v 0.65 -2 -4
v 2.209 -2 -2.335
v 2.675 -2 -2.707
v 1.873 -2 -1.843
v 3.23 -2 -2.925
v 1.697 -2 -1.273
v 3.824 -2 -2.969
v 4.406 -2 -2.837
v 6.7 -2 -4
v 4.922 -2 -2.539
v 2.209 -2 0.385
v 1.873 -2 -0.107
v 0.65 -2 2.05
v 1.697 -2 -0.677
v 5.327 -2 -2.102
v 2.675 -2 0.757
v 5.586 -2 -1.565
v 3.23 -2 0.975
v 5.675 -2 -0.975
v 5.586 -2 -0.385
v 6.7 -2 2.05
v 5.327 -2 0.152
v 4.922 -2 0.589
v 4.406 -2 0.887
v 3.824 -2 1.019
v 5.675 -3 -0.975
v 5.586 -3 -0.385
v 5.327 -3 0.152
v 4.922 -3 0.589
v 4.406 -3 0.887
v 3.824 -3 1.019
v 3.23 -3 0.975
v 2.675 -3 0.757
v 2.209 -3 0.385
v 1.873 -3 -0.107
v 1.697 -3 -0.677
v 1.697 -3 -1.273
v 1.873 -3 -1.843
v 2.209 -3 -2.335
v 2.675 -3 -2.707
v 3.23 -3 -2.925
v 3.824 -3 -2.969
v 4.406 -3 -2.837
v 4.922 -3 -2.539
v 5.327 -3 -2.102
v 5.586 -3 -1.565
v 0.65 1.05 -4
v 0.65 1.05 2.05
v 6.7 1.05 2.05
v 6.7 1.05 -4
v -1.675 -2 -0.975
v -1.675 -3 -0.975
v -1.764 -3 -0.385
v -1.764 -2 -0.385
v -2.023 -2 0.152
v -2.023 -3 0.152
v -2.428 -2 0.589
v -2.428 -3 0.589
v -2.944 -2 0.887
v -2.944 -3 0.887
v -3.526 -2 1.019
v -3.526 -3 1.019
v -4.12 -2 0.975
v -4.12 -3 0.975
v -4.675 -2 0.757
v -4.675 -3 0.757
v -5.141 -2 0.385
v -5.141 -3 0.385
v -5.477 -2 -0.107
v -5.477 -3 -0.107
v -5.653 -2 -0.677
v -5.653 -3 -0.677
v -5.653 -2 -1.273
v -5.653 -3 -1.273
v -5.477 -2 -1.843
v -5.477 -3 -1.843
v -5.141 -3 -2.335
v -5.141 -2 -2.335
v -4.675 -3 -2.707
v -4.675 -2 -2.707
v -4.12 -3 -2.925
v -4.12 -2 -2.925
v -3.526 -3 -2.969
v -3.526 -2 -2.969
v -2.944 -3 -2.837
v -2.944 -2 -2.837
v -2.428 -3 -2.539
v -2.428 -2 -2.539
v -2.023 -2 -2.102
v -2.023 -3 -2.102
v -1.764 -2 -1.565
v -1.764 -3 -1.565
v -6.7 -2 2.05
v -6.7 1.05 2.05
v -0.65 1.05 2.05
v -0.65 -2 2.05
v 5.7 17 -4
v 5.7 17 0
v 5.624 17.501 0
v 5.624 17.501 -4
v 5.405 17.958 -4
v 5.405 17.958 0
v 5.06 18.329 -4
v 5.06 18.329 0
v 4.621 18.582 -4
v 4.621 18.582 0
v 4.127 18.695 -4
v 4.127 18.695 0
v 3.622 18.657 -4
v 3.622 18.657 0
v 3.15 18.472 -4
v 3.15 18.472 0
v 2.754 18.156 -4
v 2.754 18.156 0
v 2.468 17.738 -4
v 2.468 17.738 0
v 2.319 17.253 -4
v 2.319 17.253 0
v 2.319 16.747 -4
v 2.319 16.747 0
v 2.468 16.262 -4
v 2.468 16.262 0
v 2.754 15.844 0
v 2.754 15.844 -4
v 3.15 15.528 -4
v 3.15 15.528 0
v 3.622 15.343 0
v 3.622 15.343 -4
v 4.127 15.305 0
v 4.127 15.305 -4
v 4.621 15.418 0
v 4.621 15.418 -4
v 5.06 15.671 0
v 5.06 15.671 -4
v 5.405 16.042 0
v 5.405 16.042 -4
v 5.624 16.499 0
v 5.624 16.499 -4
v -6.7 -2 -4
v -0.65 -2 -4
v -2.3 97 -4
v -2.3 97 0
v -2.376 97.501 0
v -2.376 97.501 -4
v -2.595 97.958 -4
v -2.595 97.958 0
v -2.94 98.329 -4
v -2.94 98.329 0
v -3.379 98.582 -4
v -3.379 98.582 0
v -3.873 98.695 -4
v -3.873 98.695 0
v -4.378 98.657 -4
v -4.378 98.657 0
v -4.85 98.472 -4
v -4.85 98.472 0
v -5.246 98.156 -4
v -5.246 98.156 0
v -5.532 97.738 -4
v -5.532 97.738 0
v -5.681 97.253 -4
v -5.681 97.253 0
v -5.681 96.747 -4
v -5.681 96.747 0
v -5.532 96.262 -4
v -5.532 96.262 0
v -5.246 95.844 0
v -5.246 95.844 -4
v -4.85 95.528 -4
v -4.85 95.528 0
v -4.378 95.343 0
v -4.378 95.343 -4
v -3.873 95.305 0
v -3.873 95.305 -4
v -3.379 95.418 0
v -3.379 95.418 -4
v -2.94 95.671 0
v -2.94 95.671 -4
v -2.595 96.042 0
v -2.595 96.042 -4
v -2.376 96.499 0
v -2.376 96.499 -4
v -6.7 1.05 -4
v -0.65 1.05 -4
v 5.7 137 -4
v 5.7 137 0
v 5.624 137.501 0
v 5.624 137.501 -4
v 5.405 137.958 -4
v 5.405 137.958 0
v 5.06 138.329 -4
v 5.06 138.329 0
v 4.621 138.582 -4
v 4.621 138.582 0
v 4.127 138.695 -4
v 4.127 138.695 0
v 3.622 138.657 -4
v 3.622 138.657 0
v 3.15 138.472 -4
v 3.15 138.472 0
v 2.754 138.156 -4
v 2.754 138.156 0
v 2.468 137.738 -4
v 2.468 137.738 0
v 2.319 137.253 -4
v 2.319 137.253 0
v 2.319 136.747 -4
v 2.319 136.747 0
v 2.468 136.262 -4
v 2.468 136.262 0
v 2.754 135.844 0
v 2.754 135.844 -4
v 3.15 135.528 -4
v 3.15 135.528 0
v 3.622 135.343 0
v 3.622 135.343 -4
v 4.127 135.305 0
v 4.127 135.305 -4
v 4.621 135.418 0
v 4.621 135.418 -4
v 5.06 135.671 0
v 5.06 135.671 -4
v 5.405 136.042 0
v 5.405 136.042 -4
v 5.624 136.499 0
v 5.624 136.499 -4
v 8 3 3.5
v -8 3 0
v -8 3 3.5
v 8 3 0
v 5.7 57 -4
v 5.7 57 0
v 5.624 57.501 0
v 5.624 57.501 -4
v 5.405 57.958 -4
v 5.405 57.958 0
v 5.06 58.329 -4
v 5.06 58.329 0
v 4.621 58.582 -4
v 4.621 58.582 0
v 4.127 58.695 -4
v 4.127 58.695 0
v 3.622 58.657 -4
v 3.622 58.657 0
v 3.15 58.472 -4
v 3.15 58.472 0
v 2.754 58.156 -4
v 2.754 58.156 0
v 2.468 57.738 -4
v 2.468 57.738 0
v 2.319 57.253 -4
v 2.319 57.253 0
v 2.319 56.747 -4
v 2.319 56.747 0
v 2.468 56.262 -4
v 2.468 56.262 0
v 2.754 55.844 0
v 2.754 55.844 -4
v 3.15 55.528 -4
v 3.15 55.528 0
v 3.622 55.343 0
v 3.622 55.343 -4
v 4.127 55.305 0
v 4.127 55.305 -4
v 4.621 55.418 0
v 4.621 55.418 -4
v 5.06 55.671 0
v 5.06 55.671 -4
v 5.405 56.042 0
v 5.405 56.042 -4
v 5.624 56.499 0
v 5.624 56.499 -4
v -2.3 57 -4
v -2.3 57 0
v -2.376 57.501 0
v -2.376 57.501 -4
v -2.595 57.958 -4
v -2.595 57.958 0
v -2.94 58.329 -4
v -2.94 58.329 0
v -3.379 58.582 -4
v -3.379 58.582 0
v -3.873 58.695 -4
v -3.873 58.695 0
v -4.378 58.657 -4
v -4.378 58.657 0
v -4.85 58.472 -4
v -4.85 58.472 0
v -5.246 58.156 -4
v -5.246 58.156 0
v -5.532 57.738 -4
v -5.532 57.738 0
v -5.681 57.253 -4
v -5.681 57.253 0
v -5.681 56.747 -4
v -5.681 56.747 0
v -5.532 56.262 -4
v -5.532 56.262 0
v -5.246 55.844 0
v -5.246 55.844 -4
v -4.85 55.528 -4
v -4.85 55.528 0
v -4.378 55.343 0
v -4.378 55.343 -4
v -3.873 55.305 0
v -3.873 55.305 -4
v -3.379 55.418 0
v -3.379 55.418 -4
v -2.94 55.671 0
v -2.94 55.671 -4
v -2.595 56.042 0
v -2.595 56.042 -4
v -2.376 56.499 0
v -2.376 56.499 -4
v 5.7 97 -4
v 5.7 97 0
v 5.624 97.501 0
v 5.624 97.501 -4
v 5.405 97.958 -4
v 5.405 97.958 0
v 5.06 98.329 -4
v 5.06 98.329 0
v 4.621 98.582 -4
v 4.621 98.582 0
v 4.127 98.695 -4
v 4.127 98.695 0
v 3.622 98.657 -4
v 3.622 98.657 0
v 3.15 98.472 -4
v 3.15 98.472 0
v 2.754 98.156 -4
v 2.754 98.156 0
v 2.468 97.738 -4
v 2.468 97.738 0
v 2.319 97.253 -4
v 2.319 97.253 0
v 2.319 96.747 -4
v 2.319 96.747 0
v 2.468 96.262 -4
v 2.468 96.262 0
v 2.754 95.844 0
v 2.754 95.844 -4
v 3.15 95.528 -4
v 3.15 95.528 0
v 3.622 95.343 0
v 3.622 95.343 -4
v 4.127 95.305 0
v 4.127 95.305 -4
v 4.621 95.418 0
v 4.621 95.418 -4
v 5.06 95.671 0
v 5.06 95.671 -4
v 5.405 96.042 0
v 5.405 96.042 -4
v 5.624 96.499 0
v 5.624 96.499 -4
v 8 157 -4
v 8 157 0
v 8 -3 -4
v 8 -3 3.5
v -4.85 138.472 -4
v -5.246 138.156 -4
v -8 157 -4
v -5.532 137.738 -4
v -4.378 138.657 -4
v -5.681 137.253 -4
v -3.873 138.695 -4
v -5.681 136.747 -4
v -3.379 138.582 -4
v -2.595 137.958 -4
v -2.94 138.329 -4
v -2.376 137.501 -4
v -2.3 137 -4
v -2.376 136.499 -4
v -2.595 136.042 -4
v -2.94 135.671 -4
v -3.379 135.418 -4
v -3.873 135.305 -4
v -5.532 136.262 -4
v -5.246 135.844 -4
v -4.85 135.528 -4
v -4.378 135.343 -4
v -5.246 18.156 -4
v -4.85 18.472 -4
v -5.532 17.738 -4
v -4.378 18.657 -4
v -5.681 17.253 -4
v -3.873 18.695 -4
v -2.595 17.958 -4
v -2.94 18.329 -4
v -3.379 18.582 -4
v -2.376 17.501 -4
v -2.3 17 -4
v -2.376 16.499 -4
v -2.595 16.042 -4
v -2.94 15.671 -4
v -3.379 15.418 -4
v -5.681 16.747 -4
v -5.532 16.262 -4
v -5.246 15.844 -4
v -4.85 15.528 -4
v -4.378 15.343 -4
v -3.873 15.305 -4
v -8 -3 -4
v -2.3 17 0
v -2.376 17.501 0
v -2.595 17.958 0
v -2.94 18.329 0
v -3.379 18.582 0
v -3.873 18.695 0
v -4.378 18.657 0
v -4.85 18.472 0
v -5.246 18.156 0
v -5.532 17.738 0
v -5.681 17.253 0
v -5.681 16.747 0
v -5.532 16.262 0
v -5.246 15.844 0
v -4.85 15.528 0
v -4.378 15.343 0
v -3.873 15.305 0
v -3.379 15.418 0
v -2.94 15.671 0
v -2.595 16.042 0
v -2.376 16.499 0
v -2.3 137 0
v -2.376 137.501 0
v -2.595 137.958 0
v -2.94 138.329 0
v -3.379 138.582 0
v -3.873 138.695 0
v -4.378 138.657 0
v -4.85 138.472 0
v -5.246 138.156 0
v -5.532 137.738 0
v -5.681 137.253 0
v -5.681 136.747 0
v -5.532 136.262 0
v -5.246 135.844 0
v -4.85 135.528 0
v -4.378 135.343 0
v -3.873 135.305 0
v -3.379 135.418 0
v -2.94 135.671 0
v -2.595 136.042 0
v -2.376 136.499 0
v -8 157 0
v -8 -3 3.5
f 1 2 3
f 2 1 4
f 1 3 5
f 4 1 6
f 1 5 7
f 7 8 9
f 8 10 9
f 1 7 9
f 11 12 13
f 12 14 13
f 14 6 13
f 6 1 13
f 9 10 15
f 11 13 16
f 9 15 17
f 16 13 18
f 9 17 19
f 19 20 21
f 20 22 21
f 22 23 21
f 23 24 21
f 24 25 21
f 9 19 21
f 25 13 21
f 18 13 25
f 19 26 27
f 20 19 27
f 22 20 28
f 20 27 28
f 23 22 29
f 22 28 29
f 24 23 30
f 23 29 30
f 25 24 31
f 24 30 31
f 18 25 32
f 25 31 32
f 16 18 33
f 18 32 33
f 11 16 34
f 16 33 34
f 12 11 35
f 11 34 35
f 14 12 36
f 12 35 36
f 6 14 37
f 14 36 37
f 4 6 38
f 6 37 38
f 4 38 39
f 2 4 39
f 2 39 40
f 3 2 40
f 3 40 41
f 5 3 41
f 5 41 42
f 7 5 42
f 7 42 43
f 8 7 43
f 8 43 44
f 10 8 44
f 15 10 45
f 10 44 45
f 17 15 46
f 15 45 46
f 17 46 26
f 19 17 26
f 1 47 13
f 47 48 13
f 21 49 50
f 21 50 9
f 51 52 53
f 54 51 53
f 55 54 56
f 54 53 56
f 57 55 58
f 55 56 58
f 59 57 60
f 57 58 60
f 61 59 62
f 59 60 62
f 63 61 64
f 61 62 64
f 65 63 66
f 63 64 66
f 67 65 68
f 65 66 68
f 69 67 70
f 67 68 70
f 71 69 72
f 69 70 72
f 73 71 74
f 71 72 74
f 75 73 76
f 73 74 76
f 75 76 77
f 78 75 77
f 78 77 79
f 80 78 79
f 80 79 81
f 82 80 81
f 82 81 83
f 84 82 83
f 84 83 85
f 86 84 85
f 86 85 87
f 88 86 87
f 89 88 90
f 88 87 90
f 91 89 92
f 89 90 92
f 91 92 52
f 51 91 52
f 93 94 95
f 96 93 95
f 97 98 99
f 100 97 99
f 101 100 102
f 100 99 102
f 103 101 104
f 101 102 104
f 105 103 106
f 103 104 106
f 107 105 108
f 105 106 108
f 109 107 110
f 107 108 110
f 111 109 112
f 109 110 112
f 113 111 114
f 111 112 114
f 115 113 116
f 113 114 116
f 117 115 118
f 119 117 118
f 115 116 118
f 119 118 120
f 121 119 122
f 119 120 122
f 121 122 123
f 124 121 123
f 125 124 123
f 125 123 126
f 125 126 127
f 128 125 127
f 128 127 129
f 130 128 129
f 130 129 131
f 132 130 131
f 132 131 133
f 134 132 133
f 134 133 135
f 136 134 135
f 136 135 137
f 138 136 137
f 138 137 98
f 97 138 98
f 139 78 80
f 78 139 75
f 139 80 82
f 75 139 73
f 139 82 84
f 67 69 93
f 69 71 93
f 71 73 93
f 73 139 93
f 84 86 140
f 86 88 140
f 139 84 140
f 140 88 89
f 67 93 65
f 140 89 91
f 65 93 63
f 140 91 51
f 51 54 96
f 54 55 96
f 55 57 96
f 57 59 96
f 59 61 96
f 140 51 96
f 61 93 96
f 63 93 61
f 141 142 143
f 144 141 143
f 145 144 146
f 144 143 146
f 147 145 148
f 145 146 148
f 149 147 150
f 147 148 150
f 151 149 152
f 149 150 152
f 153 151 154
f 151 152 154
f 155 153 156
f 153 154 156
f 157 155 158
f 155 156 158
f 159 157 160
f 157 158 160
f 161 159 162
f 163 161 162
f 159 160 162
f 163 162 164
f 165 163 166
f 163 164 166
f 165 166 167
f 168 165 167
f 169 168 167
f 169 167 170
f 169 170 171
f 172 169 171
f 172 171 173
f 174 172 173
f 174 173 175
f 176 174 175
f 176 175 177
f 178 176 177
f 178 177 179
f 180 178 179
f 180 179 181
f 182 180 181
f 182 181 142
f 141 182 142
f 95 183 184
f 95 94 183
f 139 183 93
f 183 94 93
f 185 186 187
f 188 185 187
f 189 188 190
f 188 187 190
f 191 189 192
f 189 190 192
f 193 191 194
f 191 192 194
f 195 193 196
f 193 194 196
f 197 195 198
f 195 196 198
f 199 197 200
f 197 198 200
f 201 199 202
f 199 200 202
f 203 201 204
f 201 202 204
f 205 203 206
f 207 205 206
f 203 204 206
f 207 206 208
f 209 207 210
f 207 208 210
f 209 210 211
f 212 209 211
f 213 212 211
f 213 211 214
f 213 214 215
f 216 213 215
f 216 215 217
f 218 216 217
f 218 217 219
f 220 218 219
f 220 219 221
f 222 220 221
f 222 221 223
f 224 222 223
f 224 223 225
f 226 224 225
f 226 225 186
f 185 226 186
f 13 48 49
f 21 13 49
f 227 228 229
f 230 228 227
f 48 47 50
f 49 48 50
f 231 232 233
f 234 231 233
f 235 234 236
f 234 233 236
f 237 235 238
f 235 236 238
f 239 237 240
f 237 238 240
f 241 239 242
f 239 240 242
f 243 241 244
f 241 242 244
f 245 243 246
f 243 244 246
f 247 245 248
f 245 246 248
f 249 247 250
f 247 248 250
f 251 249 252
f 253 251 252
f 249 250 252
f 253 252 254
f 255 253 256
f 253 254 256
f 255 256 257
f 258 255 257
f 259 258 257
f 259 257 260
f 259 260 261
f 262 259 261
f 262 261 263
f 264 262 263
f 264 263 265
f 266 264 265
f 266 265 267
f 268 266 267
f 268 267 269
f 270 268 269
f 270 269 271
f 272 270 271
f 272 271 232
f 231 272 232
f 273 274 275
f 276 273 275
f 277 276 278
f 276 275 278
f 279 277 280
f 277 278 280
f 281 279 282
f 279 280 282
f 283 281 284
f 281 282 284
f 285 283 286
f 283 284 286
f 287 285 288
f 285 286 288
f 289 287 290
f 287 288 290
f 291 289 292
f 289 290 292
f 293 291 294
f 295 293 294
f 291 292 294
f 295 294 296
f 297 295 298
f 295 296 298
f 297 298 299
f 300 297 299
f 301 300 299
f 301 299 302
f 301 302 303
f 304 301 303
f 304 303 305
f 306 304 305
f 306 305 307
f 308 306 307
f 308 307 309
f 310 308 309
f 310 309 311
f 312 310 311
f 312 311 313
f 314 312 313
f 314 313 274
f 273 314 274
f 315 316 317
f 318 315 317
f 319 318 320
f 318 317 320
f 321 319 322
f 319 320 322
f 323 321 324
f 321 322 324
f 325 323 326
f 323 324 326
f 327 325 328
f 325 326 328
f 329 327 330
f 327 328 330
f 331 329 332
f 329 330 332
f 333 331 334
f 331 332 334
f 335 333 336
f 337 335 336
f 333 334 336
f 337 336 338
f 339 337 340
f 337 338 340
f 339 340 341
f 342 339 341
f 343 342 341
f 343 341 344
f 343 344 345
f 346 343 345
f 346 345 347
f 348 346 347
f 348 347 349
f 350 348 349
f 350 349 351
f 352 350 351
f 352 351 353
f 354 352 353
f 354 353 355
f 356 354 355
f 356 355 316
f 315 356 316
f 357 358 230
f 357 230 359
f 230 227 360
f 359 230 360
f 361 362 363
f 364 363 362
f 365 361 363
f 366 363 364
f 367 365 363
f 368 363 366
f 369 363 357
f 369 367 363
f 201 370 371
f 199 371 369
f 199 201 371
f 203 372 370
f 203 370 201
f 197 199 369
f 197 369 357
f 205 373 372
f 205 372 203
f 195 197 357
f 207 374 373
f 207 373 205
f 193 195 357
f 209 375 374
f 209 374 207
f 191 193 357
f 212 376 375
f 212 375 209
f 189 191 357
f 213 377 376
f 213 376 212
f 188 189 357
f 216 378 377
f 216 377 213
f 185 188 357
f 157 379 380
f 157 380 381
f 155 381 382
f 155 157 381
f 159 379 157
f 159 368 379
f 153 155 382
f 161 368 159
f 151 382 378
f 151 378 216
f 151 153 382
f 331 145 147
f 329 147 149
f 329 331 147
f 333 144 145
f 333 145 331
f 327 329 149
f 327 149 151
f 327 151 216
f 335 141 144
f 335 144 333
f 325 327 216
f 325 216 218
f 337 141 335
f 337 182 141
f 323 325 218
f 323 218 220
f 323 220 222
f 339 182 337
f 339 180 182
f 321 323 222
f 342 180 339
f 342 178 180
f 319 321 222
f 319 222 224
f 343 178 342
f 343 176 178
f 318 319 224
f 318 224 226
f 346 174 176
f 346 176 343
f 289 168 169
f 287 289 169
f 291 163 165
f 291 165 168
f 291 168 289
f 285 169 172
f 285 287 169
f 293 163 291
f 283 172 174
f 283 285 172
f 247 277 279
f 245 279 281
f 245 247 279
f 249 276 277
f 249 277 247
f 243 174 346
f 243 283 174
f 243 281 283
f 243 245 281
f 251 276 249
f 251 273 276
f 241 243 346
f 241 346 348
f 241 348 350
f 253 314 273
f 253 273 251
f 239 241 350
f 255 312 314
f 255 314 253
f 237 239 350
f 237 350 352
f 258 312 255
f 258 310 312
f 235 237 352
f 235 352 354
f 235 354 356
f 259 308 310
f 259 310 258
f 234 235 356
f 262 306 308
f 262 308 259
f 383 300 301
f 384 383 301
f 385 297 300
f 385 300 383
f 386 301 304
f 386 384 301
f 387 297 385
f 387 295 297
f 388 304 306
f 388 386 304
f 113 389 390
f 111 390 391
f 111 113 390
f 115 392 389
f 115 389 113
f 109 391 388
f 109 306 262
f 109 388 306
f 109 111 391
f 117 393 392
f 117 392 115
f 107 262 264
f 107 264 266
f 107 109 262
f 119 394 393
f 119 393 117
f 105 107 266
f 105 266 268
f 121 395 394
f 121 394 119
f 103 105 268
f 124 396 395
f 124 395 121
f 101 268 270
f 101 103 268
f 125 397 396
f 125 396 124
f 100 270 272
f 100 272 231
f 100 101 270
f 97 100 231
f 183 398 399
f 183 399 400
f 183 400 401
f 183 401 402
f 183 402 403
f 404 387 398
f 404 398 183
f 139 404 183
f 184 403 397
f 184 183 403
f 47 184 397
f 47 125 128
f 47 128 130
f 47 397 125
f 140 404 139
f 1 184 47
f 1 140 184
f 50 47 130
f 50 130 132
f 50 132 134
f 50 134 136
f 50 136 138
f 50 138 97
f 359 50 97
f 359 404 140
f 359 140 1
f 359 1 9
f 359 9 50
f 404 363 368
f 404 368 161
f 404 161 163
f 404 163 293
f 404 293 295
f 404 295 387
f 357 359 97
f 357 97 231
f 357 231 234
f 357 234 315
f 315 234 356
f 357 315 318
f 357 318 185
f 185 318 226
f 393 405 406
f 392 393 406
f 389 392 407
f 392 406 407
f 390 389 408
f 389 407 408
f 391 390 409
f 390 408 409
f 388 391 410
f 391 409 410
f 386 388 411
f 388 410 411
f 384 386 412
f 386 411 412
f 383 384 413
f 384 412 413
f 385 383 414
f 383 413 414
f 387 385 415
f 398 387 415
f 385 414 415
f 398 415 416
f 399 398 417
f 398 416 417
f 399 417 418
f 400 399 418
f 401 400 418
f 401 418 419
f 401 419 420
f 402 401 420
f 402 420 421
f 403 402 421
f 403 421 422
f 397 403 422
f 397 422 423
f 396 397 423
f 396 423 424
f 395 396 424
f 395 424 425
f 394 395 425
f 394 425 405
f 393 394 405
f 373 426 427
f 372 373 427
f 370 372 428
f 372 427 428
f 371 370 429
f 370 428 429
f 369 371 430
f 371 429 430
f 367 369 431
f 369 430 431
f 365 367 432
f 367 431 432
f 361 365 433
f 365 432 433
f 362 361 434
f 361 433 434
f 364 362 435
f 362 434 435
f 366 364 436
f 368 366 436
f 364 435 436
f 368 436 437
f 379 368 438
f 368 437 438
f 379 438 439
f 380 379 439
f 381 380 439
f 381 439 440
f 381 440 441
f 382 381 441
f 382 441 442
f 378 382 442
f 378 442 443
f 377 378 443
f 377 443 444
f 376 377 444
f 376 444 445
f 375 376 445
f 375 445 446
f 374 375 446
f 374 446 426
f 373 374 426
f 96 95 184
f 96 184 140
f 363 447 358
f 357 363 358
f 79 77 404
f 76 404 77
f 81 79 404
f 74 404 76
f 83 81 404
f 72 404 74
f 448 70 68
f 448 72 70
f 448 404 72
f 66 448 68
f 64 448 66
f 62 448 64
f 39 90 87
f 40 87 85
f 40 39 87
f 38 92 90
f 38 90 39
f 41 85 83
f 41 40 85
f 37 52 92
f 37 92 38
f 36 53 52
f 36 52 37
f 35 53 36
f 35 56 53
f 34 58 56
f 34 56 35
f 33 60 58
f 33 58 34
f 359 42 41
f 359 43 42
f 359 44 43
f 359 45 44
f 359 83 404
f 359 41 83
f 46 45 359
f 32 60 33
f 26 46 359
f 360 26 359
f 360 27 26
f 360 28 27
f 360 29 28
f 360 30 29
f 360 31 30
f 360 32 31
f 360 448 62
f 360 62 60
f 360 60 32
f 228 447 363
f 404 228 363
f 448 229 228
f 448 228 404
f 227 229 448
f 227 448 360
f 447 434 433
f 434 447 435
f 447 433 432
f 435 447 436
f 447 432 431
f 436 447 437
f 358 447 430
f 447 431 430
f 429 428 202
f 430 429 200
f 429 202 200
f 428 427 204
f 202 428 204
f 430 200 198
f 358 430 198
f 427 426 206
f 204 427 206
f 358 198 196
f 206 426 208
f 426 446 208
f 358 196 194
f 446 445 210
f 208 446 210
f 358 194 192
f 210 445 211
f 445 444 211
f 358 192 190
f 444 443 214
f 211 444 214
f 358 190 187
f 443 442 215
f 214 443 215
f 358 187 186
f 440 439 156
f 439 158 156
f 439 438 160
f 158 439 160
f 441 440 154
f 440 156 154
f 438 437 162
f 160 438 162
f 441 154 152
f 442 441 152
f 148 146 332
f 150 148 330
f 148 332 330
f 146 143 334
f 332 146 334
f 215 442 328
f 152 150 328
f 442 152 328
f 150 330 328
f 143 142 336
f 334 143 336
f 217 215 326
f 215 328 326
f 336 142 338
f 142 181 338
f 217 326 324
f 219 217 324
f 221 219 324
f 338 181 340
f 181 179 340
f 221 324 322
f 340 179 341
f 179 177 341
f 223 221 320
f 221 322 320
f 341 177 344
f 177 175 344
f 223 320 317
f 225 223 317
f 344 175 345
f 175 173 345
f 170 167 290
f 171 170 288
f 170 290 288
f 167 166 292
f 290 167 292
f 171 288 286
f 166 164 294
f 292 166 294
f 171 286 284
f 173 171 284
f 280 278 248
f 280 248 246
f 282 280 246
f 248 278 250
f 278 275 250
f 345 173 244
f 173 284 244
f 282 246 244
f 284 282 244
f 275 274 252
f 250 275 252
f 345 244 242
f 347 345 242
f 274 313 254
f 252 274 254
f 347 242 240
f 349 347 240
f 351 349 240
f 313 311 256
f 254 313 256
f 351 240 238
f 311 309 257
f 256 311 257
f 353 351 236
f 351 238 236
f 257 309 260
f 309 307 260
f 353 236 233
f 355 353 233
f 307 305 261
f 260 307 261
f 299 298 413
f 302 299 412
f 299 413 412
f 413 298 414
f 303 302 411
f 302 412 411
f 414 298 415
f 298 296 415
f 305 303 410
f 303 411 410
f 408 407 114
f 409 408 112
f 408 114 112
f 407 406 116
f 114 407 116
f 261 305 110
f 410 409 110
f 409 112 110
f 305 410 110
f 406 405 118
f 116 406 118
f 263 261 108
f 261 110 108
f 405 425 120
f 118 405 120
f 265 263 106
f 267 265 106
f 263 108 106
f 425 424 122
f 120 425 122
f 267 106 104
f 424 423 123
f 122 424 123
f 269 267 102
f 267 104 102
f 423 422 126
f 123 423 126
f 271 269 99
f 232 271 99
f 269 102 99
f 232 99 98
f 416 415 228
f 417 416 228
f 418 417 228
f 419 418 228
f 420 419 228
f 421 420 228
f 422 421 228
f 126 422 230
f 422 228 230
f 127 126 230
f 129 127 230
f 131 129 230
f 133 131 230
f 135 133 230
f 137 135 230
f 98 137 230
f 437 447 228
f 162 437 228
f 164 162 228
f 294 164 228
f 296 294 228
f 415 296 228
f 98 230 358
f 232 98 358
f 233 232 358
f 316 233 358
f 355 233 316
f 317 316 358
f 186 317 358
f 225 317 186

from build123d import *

# Parameters (mm, degrees)
SKETCH_W      = 16
SKETCH_H      = 6
SKETCH_W_2    = 6.05
SKETCH_H_2    = 3.05
PAD_DEPTH     = 2.05
SKETCH001_W   = 16
SKETCH001_H   = 6
PAD001_DEPTH  = 1.45
SKETCH002_W   = 16
SKETCH002_H   = 160
SKETCH002_W_2 = 6.05
SKETCH002_H_2 = 3.05
PAD002_DEPTH  = 4
SKETCH003_R   = 1.7
HOLE_DEPTH    = 25
SKETCH004_R   = 2
POCKET_DEPTH  = 1


with BuildPart() as part:
    # Sketch → Pad (new body)
    with BuildSketch(Plane.XY):
        Rectangle(SKETCH_W, SKETCH_H)
        with Locations((3.675, -0.475)):
            Rectangle(SKETCH_W_2, SKETCH_H_2, mode=Mode.SUBTRACT)
        with Locations((-3.675, -0.475)):
            Rectangle(SKETCH_W_2, SKETCH_H_2, mode=Mode.SUBTRACT)
    extrude(amount=PAD_DEPTH)

    # Sketch001 (on Face14 of Pad) → Pad001 (join)
    with BuildSketch(Plane.XY.offset(2.05)):
        Rectangle(SKETCH001_W, SKETCH001_H)
    extrude(amount=PAD001_DEPTH)

    # Sketch002 (on Face1 of Pad001) → Pad002 (join)
    with BuildSketch(Plane(origin=(0, 0, 0), x_dir=(1, 0, 0), z_dir=(0, 0, -1))):
        with Locations((0, -77)):
            Rectangle(SKETCH002_W, SKETCH002_H)
        with Locations((-3.675, 0.475)):
            Rectangle(SKETCH002_W_2, SKETCH002_H_2, mode=Mode.SUBTRACT)
        with Locations((3.675, 0.475)):
            Rectangle(SKETCH002_W_2, SKETCH002_H_2, mode=Mode.SUBTRACT)
    extrude(amount=PAD002_DEPTH)

    # Sketch003 (on Face3 of Pad002) → Hole (cut)
    with BuildSketch(Plane.XY):
        with Locations((4, 97)):
            Circle(SKETCH003_R)
        with Locations((-4, 97)):
            Circle(SKETCH003_R)
        with Locations((4, 17)):
            Circle(SKETCH003_R)
        with Locations((-4, 17)):
            Circle(SKETCH003_R)
        with Locations((4, 57)):
            Circle(SKETCH003_R)
        with Locations((-4, 57)):
            Circle(SKETCH003_R)
        with Locations((-4, 137)):
            Circle(SKETCH003_R)
        with Locations((4, 137)):
            Circle(SKETCH003_R)
    extrude(amount=-HOLE_DEPTH, mode=Mode.SUBTRACT)

    # Sketch004 (on Face3 of Hole) → Pocket (cut)
    with BuildSketch(Plane.XZ.offset(3)):
        with Locations((-3.675, -0.975)):
            Circle(SKETCH004_R)
        with Locations((3.675, -0.975)):
            Circle(SKETCH004_R)
    extrude(amount=-POCKET_DEPTH, mode=Mode.SUBTRACT)


solid = part.part
